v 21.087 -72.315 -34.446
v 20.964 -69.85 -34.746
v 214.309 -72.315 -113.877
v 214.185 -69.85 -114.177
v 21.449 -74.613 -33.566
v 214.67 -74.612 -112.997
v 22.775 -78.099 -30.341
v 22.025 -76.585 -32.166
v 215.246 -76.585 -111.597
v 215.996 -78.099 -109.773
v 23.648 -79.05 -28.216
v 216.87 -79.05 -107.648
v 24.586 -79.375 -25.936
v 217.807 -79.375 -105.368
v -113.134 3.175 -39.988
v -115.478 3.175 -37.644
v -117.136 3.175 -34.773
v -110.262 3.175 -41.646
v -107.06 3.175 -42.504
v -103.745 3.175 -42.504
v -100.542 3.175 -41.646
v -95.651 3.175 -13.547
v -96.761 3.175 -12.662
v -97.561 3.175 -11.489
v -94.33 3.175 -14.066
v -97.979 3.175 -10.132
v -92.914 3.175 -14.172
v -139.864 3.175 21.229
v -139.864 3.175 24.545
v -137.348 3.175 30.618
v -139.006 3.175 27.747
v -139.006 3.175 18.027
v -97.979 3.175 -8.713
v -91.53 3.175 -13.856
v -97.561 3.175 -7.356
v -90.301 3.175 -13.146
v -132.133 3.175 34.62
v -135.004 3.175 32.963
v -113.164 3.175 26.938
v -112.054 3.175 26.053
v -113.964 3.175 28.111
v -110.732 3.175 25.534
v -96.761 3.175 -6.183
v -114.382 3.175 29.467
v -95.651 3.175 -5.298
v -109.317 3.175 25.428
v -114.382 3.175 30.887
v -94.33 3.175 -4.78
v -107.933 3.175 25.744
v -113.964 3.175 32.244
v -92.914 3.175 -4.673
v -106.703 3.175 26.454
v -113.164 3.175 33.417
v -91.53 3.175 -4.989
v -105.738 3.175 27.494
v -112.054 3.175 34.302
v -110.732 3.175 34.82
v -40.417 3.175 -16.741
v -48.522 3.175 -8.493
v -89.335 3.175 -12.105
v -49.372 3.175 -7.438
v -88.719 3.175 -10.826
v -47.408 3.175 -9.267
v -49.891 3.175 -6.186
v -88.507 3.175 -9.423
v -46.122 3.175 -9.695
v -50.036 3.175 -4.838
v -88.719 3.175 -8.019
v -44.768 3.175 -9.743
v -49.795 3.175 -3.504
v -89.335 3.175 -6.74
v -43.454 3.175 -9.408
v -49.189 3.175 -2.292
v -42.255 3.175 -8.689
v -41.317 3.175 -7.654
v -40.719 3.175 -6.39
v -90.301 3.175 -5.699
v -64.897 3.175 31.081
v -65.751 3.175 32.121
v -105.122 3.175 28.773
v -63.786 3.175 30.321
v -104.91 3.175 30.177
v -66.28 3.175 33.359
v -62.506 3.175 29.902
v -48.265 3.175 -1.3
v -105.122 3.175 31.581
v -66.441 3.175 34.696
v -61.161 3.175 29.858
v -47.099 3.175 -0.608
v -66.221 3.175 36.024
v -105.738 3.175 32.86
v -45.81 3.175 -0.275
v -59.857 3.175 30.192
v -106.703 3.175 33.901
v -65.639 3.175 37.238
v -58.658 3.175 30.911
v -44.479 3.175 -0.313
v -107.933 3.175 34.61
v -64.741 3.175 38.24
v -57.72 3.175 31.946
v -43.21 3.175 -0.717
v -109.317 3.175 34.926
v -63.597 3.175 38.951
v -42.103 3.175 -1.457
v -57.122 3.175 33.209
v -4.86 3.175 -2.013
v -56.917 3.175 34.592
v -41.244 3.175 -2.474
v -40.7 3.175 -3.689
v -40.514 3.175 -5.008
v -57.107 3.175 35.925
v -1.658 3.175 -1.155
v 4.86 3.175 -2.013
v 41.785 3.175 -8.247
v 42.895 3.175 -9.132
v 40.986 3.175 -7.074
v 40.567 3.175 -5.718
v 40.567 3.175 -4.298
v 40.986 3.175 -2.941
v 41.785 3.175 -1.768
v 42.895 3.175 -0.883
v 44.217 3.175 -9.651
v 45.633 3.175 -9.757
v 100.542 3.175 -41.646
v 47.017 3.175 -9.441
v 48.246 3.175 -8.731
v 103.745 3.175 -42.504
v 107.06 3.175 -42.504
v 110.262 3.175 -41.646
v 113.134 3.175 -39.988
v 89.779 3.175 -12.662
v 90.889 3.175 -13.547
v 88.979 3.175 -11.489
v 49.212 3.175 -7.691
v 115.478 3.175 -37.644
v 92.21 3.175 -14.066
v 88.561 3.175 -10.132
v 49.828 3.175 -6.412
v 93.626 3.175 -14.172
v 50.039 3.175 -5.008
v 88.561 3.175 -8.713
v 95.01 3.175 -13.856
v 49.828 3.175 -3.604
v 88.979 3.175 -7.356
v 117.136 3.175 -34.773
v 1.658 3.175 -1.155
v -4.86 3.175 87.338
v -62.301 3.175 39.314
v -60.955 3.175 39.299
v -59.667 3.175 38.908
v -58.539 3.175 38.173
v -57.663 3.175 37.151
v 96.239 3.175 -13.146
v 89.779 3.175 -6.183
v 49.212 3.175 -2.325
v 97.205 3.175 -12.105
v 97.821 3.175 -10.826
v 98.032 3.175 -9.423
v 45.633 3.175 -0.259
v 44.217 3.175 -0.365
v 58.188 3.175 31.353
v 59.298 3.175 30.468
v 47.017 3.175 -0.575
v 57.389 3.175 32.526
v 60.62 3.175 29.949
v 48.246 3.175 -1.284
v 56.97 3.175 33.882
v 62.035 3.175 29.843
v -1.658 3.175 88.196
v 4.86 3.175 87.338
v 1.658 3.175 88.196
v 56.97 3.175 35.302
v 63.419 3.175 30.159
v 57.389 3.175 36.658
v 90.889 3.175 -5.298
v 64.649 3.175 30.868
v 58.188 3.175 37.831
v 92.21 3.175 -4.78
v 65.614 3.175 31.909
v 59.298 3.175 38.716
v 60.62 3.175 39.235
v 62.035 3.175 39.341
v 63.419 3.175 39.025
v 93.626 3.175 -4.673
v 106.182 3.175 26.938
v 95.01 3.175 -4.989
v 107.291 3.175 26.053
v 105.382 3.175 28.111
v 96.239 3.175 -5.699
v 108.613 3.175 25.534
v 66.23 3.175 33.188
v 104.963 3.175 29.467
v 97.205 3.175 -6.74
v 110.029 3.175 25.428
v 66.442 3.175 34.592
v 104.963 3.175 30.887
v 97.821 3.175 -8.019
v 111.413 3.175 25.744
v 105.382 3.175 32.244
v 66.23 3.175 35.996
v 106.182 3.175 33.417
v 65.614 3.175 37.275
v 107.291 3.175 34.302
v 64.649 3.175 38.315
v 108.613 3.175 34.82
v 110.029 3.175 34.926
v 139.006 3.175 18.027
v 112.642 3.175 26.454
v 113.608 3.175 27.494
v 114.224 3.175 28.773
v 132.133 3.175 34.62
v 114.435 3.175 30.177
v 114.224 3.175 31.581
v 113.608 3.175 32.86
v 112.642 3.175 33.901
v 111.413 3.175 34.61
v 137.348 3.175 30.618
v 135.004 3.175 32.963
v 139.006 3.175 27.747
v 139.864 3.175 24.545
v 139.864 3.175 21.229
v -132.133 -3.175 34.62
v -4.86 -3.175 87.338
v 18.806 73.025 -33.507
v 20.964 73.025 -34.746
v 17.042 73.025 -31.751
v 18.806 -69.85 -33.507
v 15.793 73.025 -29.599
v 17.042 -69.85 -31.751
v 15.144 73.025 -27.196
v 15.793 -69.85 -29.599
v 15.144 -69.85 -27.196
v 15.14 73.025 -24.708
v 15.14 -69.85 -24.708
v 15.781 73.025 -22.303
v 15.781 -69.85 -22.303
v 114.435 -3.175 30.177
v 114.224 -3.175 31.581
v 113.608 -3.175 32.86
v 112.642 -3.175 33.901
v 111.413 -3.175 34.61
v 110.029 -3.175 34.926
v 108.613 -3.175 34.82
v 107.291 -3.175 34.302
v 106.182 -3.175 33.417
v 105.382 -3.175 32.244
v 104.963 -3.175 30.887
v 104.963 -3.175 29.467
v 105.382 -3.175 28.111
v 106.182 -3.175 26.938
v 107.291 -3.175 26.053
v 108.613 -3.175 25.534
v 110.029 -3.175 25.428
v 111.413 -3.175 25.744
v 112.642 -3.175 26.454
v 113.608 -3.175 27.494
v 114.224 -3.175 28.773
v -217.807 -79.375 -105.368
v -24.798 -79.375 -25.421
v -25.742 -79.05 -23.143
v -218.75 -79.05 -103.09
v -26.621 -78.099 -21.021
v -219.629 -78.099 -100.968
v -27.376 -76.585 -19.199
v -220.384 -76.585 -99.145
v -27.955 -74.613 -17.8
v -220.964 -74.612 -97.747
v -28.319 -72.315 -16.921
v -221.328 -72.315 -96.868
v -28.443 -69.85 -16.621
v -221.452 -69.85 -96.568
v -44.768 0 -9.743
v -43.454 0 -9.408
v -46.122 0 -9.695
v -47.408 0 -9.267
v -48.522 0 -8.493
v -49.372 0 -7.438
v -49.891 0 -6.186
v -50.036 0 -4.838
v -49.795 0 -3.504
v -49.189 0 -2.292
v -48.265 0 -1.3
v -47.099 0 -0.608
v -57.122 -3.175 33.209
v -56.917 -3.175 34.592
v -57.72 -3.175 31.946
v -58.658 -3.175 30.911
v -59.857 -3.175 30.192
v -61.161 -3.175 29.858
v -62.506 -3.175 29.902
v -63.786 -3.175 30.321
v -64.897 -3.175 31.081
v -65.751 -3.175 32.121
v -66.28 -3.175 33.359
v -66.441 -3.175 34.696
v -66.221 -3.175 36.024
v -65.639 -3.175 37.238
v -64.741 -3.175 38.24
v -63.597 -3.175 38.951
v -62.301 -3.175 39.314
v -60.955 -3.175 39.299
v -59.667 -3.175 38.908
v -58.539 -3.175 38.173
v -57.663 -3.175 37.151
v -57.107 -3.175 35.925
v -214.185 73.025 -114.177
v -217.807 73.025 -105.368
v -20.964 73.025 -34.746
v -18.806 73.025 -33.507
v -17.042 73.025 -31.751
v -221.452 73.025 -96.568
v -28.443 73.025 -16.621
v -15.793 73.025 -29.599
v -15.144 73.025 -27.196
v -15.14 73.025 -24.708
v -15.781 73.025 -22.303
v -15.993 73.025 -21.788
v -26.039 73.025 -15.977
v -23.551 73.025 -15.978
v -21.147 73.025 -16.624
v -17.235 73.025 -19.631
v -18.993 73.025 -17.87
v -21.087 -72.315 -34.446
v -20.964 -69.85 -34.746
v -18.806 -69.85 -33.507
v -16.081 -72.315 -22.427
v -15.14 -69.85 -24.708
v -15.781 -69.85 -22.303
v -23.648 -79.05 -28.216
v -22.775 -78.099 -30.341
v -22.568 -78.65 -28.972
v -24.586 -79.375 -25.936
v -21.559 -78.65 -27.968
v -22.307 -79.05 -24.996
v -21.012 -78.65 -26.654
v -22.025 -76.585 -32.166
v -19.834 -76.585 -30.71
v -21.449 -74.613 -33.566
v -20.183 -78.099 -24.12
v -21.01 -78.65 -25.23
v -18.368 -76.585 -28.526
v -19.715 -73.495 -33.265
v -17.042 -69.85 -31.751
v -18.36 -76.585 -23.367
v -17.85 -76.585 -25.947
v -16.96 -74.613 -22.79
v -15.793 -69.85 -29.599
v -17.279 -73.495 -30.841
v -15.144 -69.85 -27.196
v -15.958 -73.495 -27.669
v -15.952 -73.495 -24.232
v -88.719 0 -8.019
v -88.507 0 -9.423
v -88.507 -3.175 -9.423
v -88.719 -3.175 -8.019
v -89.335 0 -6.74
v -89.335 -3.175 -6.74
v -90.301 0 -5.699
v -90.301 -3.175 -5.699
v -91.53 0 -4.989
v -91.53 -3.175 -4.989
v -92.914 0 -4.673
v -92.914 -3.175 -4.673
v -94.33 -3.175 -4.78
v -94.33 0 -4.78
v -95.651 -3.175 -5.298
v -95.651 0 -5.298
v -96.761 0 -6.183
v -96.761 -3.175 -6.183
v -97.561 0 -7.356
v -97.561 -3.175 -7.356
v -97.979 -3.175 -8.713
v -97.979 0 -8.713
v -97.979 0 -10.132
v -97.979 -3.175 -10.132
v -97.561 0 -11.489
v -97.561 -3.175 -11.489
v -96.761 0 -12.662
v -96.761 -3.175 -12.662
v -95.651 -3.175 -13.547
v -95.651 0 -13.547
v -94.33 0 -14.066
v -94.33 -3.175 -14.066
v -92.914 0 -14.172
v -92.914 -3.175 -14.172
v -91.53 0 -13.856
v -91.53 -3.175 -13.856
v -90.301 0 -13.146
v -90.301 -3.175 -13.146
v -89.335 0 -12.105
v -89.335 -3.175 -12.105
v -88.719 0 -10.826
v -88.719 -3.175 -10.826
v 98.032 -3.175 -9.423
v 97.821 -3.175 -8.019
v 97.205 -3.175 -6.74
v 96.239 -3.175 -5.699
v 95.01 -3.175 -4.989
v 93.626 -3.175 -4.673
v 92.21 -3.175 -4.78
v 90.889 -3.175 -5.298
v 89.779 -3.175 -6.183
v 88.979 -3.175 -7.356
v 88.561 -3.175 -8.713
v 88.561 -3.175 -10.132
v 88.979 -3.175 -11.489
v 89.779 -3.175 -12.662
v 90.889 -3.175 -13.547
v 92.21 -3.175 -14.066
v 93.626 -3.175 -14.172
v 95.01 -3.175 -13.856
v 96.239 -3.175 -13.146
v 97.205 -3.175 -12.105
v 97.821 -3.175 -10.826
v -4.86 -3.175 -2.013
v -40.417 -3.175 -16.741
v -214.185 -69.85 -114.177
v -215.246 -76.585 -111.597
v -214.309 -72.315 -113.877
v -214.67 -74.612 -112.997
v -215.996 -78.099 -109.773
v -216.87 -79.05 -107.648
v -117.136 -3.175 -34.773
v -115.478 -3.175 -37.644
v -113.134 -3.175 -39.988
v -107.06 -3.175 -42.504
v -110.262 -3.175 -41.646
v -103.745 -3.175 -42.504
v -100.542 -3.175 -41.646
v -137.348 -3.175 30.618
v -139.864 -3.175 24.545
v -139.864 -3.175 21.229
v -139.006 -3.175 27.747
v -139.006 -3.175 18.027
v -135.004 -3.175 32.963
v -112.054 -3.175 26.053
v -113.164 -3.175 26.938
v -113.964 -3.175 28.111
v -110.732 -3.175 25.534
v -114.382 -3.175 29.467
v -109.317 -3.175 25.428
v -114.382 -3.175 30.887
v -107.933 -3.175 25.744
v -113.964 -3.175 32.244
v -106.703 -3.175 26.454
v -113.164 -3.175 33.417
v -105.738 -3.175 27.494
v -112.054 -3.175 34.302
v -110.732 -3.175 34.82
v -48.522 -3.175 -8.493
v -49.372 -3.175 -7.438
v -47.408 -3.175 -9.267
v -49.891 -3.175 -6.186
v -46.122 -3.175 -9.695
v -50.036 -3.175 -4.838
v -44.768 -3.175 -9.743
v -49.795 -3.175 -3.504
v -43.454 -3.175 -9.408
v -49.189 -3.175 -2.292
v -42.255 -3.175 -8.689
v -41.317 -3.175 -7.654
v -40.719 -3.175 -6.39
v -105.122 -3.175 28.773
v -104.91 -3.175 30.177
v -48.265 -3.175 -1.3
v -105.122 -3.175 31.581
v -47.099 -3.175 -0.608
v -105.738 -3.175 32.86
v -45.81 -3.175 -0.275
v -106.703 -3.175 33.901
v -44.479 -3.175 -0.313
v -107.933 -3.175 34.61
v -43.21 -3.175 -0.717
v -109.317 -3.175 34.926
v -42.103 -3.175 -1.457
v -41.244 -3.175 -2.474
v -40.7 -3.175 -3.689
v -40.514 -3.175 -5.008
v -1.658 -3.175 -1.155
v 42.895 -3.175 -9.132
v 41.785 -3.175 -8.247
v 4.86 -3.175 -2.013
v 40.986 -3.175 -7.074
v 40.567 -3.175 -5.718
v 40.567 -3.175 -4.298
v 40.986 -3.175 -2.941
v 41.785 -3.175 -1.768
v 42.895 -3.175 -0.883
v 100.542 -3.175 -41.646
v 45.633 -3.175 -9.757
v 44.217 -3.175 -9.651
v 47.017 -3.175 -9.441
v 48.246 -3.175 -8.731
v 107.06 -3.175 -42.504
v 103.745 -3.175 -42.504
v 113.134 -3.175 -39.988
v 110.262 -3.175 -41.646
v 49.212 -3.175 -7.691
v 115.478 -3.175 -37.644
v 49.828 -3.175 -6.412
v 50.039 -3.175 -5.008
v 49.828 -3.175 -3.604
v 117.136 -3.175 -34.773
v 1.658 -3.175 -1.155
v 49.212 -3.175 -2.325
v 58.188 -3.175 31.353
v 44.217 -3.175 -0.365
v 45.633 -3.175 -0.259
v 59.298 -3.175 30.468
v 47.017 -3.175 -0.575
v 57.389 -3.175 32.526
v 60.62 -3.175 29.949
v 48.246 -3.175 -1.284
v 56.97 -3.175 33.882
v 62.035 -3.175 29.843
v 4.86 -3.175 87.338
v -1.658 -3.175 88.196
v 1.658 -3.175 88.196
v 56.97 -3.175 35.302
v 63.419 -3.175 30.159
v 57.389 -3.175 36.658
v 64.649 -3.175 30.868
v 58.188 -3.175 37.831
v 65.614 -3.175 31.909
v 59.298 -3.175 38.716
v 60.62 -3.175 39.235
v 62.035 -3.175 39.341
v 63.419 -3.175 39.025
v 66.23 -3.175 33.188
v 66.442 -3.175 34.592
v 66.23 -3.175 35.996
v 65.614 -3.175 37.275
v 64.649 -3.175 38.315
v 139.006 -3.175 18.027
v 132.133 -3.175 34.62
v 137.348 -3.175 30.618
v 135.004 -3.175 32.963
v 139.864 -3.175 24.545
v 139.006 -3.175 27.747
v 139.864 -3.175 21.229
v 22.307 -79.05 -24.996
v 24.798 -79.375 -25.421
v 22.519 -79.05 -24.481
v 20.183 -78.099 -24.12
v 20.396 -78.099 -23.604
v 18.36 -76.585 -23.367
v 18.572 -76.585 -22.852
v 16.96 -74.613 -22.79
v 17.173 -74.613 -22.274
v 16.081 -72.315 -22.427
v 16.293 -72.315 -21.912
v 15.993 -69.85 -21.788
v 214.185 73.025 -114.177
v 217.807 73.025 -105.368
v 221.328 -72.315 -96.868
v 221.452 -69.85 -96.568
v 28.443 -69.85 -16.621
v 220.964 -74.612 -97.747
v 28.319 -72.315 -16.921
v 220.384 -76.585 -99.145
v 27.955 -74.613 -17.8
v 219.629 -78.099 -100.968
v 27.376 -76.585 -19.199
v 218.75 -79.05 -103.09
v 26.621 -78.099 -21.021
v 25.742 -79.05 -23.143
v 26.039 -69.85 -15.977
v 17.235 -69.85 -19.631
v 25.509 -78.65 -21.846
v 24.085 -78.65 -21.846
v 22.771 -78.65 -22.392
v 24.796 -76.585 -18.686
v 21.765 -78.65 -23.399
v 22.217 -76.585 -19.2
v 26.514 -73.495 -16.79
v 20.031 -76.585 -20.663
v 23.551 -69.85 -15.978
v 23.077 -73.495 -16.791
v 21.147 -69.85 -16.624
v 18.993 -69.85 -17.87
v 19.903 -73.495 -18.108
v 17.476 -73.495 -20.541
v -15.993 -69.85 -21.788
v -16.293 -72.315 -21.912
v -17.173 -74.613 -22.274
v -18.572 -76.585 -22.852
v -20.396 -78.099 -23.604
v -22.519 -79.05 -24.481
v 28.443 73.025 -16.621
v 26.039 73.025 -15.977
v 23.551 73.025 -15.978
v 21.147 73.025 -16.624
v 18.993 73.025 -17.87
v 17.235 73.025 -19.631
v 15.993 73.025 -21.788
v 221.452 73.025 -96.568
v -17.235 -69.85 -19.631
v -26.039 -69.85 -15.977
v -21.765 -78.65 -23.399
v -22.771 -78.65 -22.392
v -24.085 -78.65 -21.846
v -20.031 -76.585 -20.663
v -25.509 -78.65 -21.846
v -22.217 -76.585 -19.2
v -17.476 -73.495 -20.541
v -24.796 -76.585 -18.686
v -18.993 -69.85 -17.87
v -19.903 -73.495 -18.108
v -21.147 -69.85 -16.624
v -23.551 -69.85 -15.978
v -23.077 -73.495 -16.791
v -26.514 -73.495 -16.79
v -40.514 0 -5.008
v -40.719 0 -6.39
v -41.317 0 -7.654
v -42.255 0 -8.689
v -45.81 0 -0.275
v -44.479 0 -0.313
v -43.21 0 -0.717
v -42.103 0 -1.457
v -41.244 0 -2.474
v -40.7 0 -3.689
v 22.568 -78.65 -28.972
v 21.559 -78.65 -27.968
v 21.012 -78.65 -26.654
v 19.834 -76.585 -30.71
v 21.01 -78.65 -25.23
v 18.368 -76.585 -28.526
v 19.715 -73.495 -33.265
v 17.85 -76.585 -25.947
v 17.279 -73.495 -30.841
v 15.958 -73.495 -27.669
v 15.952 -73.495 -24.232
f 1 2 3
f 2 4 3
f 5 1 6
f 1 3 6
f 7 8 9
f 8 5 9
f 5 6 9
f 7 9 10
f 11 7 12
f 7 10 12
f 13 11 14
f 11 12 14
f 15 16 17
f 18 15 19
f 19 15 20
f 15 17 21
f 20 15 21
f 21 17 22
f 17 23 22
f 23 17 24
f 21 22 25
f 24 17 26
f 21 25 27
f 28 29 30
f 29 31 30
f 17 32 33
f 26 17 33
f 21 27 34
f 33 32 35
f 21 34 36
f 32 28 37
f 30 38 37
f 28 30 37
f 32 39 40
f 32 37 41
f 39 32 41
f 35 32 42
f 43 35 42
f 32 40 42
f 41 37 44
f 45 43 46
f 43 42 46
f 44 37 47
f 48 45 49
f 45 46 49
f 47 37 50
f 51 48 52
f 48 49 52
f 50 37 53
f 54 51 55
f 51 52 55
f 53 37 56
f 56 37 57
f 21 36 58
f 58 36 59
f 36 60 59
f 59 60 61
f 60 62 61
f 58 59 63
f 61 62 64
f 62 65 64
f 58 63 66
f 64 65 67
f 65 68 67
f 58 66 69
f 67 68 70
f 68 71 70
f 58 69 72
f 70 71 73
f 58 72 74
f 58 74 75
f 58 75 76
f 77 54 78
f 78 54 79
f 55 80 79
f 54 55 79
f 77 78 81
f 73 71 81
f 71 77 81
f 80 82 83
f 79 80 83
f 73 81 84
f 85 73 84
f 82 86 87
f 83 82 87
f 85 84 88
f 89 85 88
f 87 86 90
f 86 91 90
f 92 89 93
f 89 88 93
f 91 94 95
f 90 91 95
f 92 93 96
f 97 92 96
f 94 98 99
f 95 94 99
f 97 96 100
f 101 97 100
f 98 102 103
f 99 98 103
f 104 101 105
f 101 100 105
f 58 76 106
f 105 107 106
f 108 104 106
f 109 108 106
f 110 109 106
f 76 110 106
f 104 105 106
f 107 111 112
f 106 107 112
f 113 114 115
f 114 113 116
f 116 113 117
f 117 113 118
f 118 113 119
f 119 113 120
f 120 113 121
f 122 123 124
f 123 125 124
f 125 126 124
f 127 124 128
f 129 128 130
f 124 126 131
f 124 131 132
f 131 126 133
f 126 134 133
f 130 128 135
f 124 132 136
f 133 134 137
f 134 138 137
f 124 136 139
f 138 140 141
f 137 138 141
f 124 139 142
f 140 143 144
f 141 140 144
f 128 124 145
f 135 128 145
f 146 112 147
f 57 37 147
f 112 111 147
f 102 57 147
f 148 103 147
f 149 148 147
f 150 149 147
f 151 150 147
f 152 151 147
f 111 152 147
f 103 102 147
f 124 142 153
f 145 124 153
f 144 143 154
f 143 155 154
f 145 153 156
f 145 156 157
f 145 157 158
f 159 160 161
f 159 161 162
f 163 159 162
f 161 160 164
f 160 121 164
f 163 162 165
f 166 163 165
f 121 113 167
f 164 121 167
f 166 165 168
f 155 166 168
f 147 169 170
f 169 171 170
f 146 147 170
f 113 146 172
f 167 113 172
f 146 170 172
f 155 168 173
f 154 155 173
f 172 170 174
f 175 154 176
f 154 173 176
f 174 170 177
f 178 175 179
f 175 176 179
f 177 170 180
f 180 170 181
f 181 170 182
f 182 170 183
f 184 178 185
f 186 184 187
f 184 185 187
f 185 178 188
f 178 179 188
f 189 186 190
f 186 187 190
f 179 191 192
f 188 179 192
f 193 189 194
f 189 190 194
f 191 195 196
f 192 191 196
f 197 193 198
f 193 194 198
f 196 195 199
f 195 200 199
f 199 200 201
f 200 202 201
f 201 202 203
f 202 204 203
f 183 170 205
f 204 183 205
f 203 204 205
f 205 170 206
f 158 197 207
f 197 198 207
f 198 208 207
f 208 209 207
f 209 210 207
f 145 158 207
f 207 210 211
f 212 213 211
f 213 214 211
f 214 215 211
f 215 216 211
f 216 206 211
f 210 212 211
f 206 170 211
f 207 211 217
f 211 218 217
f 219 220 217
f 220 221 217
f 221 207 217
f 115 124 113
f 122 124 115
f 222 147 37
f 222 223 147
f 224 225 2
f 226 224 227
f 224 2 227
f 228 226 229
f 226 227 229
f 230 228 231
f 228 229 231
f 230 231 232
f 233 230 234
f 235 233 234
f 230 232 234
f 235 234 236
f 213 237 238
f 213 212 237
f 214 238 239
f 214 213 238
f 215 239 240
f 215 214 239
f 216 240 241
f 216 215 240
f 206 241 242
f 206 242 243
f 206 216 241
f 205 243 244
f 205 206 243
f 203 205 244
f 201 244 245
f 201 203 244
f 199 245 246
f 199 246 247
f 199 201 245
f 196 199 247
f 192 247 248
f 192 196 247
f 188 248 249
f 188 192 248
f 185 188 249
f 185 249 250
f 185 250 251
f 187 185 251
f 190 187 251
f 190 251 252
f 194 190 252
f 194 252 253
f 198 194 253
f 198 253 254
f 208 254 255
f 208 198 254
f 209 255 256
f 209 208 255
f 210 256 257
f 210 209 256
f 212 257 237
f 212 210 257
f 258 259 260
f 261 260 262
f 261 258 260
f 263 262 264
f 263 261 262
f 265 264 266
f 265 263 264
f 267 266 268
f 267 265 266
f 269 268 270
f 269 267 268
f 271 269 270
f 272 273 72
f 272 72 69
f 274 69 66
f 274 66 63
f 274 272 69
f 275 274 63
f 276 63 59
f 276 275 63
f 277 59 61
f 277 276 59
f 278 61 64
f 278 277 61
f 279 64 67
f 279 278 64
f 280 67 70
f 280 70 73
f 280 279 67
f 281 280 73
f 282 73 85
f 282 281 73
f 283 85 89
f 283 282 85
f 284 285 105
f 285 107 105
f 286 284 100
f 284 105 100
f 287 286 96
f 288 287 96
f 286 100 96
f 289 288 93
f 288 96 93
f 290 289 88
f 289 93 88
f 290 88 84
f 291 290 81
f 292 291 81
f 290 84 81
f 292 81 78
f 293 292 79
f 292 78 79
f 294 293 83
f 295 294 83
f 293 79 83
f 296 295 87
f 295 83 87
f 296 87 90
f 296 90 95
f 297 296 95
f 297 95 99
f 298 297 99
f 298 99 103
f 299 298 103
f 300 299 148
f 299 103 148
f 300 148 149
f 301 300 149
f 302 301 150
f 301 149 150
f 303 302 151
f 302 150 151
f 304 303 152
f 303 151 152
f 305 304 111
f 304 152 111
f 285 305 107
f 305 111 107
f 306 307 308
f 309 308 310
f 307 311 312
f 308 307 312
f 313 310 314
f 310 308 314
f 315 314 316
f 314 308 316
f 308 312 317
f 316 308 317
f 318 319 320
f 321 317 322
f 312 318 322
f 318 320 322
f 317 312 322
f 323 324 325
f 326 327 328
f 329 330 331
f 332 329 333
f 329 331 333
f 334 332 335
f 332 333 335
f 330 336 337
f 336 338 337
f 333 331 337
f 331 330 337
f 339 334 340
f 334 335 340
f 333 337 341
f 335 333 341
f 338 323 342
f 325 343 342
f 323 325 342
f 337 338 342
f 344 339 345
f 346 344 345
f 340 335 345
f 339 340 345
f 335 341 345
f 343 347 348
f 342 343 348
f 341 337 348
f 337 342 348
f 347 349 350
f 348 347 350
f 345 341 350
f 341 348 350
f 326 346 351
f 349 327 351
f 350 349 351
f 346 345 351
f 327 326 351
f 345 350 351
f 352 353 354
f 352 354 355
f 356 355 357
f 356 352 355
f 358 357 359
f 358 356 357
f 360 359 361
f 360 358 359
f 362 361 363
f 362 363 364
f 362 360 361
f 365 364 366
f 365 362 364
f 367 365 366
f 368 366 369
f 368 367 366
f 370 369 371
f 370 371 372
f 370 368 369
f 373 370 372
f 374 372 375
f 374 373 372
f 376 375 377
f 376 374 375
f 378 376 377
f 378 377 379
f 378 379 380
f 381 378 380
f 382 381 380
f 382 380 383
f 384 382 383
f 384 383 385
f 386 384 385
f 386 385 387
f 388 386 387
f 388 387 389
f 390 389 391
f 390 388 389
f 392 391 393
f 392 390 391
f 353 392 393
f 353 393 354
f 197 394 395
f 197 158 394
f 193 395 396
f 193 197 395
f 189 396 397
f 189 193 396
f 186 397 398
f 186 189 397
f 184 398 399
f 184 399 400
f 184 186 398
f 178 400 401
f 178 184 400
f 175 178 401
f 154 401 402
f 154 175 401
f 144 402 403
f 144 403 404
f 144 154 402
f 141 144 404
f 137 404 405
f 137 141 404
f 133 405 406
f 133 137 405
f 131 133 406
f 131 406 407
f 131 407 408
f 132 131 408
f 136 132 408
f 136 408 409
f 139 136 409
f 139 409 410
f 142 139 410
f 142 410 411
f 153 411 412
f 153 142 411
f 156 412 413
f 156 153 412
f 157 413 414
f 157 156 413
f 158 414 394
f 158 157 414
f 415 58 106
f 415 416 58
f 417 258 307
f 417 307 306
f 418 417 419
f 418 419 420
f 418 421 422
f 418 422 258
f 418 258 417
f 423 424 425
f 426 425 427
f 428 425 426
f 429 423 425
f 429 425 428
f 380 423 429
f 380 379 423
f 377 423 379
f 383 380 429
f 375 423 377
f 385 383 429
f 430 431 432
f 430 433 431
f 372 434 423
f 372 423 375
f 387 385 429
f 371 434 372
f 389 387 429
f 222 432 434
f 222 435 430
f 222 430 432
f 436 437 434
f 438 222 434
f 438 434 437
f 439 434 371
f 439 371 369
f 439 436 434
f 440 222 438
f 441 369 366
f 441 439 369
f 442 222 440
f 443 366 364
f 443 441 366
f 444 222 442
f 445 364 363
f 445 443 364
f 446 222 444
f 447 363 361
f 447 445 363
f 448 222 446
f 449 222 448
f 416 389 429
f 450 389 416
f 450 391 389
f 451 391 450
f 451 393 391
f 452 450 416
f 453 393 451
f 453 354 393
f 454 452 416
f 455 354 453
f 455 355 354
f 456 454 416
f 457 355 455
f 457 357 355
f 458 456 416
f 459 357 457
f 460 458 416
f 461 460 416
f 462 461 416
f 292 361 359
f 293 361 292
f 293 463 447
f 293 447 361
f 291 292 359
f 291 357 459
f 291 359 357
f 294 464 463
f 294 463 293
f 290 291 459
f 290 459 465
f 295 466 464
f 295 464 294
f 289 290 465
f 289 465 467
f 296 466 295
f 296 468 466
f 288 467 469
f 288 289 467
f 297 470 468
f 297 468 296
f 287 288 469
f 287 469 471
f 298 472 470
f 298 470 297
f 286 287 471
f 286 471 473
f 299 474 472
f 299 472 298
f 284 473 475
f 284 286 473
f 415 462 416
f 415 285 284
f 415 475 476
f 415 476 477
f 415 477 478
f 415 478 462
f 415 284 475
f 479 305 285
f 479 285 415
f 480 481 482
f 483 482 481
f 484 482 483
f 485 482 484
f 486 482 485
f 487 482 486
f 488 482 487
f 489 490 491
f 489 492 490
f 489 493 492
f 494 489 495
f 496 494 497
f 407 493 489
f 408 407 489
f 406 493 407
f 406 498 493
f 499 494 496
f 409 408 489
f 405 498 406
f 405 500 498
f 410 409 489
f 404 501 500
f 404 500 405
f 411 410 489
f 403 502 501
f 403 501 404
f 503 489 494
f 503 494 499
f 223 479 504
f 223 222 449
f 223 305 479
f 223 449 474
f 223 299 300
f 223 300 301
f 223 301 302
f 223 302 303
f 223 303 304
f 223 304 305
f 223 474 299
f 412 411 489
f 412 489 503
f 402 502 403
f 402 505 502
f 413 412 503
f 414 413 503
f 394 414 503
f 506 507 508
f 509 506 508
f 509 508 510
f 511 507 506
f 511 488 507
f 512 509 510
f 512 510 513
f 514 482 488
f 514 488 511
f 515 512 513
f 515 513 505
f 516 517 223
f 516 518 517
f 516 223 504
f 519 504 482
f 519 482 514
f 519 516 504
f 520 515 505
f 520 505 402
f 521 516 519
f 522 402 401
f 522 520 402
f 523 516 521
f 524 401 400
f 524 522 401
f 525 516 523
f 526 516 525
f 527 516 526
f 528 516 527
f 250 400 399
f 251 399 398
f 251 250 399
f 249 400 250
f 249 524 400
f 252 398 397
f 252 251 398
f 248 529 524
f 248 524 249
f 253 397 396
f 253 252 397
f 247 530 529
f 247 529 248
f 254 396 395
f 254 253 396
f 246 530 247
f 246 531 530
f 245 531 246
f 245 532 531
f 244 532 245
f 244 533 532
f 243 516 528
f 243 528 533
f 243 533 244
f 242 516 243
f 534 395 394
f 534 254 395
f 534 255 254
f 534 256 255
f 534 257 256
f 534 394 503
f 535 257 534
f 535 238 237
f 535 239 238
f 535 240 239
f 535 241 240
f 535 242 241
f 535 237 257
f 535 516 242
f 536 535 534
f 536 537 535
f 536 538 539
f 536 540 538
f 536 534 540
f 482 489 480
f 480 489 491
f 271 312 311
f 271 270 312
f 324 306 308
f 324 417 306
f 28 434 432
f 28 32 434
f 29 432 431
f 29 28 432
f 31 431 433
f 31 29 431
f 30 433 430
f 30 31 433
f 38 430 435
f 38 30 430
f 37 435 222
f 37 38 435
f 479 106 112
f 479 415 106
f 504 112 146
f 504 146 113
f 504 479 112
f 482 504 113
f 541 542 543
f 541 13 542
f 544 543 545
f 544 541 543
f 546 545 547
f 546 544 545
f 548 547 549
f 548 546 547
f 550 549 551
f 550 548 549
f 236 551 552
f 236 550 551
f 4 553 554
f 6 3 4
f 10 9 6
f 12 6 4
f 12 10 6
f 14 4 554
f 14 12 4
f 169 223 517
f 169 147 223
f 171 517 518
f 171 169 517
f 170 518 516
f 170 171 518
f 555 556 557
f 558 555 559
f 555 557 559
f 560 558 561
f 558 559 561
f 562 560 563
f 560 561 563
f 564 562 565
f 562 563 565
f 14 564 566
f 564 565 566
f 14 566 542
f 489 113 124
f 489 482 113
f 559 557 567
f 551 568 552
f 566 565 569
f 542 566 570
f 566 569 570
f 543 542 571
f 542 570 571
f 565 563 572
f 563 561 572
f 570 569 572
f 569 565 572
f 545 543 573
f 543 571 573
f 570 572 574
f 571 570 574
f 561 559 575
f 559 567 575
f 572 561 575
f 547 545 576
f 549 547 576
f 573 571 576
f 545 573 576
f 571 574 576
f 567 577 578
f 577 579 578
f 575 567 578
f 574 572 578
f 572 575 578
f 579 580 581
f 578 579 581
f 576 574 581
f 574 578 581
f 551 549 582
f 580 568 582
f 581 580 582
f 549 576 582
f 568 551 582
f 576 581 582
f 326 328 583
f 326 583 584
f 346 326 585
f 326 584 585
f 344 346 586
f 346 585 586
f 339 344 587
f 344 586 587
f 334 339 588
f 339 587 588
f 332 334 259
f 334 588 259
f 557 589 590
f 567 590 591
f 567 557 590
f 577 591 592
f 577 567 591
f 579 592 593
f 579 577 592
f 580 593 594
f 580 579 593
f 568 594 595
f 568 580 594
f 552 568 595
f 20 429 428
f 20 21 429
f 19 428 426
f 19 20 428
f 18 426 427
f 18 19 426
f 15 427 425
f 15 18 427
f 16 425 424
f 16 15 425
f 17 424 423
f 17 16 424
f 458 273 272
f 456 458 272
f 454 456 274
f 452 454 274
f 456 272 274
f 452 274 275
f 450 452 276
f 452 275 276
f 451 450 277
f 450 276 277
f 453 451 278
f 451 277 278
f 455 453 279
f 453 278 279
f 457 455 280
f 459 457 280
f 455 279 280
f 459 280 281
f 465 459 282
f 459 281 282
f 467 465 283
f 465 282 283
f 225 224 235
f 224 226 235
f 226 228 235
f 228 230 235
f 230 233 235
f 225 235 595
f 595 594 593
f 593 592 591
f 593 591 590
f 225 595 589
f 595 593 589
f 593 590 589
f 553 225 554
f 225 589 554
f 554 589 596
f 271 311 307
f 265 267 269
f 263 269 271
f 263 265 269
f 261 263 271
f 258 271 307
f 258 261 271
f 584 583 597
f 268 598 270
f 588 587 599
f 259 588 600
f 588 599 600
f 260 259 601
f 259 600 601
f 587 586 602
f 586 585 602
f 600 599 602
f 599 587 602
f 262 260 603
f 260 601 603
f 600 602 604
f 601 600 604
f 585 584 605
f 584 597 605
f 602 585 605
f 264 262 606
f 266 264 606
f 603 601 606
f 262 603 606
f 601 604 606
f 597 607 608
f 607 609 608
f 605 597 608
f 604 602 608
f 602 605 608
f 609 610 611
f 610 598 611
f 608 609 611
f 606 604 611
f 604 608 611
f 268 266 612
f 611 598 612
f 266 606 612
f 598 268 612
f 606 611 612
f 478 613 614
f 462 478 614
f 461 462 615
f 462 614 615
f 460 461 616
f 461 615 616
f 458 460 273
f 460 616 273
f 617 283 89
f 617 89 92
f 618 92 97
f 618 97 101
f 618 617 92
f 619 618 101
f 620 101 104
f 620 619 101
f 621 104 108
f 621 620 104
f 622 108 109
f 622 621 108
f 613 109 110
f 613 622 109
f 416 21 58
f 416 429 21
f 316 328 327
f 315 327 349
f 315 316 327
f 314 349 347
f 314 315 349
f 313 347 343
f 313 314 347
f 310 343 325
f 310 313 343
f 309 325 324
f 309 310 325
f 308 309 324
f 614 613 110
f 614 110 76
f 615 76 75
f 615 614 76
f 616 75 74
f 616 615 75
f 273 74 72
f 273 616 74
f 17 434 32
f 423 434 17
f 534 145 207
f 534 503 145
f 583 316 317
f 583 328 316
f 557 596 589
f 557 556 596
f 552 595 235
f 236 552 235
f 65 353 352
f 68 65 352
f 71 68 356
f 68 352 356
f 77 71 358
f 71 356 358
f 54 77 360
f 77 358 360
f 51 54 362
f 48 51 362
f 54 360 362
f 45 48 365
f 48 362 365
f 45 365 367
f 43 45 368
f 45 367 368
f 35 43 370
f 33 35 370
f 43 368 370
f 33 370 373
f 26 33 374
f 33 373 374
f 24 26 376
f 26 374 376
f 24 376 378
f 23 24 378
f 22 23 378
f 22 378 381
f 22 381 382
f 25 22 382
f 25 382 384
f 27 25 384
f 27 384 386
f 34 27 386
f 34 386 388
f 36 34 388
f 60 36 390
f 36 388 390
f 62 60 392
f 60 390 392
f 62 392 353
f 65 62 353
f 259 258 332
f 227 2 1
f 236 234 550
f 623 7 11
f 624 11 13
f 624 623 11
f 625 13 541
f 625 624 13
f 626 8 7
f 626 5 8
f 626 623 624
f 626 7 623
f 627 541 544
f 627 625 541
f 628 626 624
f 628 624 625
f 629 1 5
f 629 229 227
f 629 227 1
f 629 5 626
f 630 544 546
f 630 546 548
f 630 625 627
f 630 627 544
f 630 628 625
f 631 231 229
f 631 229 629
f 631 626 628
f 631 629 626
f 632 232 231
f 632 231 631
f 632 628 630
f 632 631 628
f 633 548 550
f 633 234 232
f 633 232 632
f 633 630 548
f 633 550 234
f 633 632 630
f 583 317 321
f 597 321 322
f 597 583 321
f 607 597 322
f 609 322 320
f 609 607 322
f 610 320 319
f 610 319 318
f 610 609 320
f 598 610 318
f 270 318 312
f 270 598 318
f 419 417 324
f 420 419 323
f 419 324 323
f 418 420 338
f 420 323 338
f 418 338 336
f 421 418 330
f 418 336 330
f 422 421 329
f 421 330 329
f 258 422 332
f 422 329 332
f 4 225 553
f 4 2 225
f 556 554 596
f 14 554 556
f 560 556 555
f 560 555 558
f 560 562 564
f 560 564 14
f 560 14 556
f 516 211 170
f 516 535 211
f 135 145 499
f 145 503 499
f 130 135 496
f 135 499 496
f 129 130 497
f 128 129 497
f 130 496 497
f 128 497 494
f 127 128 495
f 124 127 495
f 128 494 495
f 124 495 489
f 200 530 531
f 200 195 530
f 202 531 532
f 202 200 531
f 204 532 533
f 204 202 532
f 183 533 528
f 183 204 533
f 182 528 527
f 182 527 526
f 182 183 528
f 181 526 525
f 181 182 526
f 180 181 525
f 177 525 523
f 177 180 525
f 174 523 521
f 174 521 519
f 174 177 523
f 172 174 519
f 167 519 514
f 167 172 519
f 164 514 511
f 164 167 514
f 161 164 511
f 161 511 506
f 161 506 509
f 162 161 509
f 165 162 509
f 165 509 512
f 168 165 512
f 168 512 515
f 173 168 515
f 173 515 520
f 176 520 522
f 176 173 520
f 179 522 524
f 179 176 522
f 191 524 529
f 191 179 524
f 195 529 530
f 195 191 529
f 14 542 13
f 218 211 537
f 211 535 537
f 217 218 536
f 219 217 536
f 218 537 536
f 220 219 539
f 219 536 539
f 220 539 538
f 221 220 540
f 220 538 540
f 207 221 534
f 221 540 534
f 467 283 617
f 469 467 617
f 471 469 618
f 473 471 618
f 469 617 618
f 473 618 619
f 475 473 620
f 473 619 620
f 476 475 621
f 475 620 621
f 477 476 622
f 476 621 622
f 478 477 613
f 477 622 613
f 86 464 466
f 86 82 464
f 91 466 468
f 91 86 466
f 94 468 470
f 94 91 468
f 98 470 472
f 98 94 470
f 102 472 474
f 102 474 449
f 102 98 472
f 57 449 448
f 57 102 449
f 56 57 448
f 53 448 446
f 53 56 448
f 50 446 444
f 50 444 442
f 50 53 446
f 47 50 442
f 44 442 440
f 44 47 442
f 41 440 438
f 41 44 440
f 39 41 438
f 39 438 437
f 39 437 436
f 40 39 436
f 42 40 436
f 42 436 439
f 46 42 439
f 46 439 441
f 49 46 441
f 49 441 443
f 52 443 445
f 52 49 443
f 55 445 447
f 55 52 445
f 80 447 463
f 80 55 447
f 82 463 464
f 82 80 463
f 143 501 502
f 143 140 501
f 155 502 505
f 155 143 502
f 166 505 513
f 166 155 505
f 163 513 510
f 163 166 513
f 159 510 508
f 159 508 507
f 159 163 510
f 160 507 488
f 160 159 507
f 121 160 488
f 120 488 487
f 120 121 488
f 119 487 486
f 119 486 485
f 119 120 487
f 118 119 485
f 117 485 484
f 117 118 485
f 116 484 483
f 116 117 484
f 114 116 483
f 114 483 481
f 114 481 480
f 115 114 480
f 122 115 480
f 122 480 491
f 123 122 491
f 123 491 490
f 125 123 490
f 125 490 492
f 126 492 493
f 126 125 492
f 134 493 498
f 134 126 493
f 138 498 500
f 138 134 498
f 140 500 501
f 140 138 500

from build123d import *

# Parameters (mm, degrees)
F0_R     = 4.7625
F1_DEPTH = 3.175
F2_R     = 12.7
F3_DEPTH = 76.2
F4_R     = 9.525
F4_2_R   = 9.525


with BuildPart() as f1:
    # F0 (on Front) → F1 (new body, symmetric)
    with BuildSketch(Plane.XZ):
        Polygon((-40.4165609485, -16.7410876894), (0, 0), (0, 89.3514761341), (-143.8659498691, 29.7602485347), (-112.2754325273, -46.5060068741), align=None)
        with Locations((-93.2699265011, -9.4226090129)):
            Circle(F0_R, mode=Mode.SUBTRACT)
        with BuildLine():
            ThreePointArc((-40.5141405396, -5.0078176265), (-41.316766511, -7.6537208612), (-43.4541106929, -9.4077939001))
            ThreePointArc((-43.4541106929, -9.4077939001), (-49.6766168132, -6.8303474731), (-47.0991703862, -0.6078413529))
            ThreePointArc((-47.0991703862, -0.6078413529), (-42.6307373048, -1.0479435979), (-40.5141405396, -5.0078176265))
        make_face(mode=Mode.SUBTRACT)
        with Locations((-109.6726951208, 30.1771774494)):
            Circle(F0_R, mode=Mode.SUBTRACT)
        with BuildLine():
            ThreePointArc((-56.9169091593, 34.5919688358), (-57.7195351307, 31.946065601), (-59.8568793127, 30.1919925622))
            ThreePointArc((-59.8568793127, 30.1919925622), (-65.6392831879, 37.2378720706), (-56.9169091593, 34.5919688358))
        make_face(mode=Mode.SUBTRACT)
        Polygon((0, 89.3514761341), (0, 0), (112.2754325273, -46.5060068741), (143.8659498691, 29.7602485347), align=None)
        with Locations((45.2766405396, -5.0078176265)):
            Circle(F0_R, mode=Mode.SUBTRACT)
        with Locations((93.2699265011, -9.4226090129)):
            Circle(F0_R, mode=Mode.SUBTRACT)
        with Locations((61.6794091593, 34.5919688358)):
            Circle(F0_R, mode=Mode.SUBTRACT)
        with Locations((109.6726951208, 30.1771774494)):
            Circle(F0_R, mode=Mode.SUBTRACT)
    extrude(amount=F1_DEPTH, both=True)

    # F2
    f2_edges = [f1.edges().sort_by_distance(p)[0] for p in [
        (-143.86595, 0, 29.760249),
        (0, 0, 89.351476),
        (0, 0, 0),
        (112.275433, 0, -46.506007),
        (143.86595, 0, 29.760249),
        (-112.275433, 0, -46.506007),
    ]]
    fillet(f2_edges, radius=F2_R)


with BuildPart() as f1b:
    # F0 (on Front) → F1, piece 2 (new body, symmetric)
    with BuildSketch(Plane.XZ):
        Polygon((-12.1426400097, -31.1194647295), (-19.6315676376, -12.9711623258), (-221.4519007896, -96.56788148), (-217.8068410963, -105.3678340271), (-214.1852704835, -114.177479383), align=None)
    extrude(amount=F1_DEPTH, both=True)

    # F3 (add, symmetric): a face of the model
    f3_faces = [f1b.faces().sort_by_distance(p)[0] for p in [
        (-116.342910997, -3.175, -63.4985719637),
    ]]
    extrude(f3_faces, amount=F3_DEPTH, both=True)

    # F4#2
    f4_2_edges = [f1b.edges().sort_by_distance(p)[0] for p in [
        (-12.14264, -3.175, -31.119465),
        (-120.541734, -79.375, -54.769522),
        (-113.163955, -79.375, -72.648472),
        (-19.631568, -3.175, -12.971162),
        (-15.887104, -79.375, -22.045314),
    ]]
    fillet(f4_2_edges, radius=F4_2_R)


with BuildPart() as f1c:
    # F0 (on Front) → F1, piece 3 (new body, symmetric)
    with BuildSketch(Plane.XZ):
        Polygon((221.4519007896, -96.56788148), (19.6315676376, -12.9711623258), (12.1426400097, -31.1194647295), (214.1852704835, -114.177479383), (217.8068410963, -105.3678340271), align=None)
    extrude(amount=F1_DEPTH, both=True)

    # F3#2 (add, symmetric): a face of the model
    f3_2_faces = [f1c.faces().sort_by_distance(p)[0] for p in [
        (116.342910997, -3.175, -63.4985719637),
    ]]
    extrude(f3_2_faces, amount=F3_DEPTH, both=True)

    # F4
    f4_edges = [f1c.edges().sort_by_distance(p)[0] for p in [
        (19.631568, -3.175, -12.971162),
        (12.14264, -3.175, -31.119465),
        (120.541734, -79.375, -54.769522),
        (113.163955, -79.375, -72.648472),
        (15.887104, -79.375, -22.045314),
    ]]
    fillet(f4_edges, radius=F4_R)


solid = Compound([f1.part, f1b.part, f1c.part])
